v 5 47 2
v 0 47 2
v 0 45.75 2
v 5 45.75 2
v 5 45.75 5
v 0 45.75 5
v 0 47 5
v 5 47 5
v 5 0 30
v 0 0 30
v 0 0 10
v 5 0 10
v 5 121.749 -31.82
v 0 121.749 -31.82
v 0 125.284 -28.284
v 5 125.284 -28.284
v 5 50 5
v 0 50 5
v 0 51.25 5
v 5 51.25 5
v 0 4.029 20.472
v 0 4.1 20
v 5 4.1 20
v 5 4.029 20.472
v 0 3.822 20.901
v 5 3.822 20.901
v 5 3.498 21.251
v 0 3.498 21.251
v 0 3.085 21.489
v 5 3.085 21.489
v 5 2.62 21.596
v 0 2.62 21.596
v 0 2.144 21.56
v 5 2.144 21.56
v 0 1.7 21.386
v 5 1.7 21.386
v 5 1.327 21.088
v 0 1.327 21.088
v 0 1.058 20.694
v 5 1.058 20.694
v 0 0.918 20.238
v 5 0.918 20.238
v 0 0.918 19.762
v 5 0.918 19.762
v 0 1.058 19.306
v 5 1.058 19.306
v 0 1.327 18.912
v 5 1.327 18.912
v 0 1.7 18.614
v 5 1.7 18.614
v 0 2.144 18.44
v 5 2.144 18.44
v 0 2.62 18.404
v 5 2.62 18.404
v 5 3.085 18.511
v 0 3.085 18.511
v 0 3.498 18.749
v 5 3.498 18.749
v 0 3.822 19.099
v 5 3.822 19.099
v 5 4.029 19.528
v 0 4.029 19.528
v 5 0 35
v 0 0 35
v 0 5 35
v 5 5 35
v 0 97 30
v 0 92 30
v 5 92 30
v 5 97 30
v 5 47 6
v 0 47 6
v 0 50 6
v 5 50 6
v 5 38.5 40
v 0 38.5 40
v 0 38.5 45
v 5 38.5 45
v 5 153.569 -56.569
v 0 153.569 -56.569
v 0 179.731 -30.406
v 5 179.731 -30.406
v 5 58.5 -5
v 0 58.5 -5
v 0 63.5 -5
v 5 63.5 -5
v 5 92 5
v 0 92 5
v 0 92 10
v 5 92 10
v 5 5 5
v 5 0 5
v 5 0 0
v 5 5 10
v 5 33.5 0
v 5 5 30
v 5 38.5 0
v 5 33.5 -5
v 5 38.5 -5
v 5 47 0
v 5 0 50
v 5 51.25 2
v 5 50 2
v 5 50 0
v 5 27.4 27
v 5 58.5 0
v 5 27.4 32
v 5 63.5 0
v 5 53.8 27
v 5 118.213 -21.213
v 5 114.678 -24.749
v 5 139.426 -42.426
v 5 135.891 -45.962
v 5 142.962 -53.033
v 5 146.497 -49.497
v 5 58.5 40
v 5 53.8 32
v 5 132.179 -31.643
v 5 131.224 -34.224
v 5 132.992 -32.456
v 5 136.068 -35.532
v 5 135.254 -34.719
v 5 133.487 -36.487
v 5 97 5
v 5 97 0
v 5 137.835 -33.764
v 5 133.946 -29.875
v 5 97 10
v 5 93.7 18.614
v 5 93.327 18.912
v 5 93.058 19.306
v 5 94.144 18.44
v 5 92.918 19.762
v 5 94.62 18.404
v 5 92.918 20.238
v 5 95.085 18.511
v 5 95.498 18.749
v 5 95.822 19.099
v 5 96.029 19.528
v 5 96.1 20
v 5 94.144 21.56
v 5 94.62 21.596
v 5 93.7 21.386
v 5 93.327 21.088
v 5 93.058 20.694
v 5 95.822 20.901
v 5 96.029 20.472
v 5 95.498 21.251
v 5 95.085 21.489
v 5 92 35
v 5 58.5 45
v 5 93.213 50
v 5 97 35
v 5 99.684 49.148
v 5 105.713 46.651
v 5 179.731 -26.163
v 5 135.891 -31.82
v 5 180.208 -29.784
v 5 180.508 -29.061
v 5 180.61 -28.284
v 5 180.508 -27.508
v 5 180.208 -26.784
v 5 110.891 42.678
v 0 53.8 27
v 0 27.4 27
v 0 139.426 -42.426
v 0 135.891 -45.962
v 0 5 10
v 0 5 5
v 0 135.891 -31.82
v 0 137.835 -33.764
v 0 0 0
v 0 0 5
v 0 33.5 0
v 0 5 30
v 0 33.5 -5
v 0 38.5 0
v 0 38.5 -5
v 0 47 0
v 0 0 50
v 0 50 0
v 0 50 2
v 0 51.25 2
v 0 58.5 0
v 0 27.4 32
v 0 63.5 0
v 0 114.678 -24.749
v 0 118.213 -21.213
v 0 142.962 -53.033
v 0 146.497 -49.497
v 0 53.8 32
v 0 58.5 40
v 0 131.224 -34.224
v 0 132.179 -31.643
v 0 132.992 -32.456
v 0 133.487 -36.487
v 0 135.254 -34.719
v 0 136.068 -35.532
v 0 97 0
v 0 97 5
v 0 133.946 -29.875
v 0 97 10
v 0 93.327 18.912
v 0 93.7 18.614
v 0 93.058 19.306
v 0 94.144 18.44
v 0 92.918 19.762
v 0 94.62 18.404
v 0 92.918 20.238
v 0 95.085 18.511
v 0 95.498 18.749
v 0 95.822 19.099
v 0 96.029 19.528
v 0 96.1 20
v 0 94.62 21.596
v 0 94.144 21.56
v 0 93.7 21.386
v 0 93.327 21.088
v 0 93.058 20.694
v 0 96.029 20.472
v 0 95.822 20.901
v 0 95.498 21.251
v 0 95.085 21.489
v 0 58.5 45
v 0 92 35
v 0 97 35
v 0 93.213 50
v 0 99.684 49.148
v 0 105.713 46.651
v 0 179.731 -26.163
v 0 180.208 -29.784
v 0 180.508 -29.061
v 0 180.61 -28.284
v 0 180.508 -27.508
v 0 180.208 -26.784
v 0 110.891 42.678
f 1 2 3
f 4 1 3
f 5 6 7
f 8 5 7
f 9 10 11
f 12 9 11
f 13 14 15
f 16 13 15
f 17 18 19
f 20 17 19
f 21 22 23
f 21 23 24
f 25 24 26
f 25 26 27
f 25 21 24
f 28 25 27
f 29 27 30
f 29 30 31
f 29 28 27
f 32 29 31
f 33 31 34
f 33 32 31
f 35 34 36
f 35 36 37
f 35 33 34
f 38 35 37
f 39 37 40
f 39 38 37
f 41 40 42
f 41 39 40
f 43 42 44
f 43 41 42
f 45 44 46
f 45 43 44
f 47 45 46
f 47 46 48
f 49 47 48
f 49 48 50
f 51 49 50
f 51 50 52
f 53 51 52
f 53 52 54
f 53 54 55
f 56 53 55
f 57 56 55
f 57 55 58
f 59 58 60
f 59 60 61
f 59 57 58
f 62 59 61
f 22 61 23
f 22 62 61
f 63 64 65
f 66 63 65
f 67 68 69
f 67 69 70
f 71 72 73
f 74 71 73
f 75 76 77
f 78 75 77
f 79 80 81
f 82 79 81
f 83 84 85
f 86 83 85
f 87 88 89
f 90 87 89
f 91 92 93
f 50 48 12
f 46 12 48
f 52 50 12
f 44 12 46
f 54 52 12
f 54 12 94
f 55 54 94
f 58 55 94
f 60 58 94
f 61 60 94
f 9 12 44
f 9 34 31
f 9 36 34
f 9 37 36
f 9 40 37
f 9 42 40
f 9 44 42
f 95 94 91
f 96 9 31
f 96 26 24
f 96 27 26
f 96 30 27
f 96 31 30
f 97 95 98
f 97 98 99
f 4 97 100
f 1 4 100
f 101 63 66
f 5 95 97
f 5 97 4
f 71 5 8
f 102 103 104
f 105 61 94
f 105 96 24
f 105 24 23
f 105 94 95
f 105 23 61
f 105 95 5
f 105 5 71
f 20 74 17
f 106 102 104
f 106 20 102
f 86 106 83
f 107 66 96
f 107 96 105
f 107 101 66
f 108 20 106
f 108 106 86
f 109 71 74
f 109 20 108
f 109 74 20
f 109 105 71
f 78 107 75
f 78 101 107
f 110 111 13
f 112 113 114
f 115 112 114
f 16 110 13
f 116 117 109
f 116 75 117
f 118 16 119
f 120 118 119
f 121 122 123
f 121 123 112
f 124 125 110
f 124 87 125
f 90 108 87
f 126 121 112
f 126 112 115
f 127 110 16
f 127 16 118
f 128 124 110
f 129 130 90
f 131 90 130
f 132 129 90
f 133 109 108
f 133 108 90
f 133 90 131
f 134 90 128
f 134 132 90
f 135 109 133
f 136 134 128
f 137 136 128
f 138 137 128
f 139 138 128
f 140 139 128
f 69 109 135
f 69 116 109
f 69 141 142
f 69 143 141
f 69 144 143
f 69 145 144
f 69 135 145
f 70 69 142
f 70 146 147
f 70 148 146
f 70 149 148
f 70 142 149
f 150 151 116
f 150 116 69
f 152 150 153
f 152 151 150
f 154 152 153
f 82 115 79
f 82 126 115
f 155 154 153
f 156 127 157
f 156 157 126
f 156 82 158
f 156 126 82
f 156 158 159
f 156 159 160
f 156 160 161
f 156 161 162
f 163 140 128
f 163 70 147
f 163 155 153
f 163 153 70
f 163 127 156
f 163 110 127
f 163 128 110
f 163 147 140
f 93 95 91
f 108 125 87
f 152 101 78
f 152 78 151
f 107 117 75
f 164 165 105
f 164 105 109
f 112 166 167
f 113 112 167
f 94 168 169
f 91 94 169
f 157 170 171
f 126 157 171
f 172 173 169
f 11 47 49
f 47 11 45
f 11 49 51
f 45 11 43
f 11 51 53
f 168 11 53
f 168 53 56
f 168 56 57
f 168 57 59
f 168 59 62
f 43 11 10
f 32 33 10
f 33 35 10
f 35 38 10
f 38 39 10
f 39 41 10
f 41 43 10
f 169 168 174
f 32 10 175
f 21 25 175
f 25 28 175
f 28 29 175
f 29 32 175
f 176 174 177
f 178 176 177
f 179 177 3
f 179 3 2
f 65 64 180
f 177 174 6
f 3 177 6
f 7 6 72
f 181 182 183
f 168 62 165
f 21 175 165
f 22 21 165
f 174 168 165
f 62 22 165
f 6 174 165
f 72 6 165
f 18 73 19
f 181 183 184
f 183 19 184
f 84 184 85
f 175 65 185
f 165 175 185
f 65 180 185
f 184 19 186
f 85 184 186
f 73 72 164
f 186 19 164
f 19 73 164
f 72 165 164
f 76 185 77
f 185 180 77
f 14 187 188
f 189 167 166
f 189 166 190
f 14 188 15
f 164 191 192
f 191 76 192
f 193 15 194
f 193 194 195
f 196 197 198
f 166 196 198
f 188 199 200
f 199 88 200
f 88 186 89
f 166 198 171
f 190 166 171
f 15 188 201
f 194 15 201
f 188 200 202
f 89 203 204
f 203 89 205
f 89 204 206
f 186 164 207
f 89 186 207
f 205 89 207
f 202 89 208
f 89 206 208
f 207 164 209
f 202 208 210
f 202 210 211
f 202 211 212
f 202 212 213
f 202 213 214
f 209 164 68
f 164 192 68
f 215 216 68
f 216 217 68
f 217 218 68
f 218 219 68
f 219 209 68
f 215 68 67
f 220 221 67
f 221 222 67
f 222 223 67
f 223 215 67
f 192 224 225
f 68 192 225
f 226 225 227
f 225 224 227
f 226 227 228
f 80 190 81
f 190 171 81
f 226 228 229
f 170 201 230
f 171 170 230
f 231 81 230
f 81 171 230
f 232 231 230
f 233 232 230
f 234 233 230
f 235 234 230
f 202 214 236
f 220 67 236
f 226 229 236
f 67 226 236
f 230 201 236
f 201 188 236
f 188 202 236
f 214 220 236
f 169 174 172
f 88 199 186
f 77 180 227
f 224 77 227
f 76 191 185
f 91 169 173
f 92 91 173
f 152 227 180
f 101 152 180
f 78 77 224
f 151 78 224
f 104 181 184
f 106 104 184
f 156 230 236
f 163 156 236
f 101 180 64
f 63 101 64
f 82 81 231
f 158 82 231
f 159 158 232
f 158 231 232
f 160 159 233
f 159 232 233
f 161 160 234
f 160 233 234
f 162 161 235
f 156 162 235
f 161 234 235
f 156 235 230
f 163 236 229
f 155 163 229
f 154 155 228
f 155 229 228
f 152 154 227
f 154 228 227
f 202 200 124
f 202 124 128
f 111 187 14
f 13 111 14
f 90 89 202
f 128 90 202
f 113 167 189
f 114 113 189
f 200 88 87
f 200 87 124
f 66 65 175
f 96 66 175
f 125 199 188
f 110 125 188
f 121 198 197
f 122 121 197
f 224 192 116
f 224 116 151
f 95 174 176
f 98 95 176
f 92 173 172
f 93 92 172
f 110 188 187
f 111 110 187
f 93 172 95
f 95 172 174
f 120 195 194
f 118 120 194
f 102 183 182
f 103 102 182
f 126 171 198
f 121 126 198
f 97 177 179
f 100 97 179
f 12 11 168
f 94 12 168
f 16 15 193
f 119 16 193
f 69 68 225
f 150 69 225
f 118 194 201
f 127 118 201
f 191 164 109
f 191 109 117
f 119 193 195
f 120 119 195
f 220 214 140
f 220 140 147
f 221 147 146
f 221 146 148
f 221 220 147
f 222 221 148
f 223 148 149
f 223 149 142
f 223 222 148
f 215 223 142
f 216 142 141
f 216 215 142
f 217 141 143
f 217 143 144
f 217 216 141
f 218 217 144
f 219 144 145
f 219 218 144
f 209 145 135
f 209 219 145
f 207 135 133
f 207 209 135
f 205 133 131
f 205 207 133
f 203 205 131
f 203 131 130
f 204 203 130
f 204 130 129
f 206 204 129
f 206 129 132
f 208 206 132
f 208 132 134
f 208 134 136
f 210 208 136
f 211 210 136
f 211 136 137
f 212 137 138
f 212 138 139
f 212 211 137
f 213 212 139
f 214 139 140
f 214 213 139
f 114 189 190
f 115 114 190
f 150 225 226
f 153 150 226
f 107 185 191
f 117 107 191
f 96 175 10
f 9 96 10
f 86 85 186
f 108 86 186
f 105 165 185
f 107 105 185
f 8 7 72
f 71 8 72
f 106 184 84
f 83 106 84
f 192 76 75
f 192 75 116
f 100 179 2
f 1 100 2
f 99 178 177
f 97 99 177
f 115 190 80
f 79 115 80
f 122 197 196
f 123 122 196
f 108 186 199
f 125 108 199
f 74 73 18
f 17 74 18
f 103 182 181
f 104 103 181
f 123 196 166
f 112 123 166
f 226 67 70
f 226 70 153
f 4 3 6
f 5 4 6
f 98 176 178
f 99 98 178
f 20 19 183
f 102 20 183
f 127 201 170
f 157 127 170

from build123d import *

# Parameters (mm, degrees)
F1_R     = 1.6
F1_W     = 26.4
F1_H     = 5
F1_W_2   = 20
F1_W_3   = 5
F2_DEPTH = 5


with BuildPart() as f2:
    # F1 (on Right) → F2 (new body)
    with BuildSketch(Plane.YZ):
        with BuildLine():
            Line((0, 5), (0, 0))
            Line((0, 0), (33.5, 0))
            Line((33.5, 0), (33.5, -5))
            Line((33.5, -5), (38.5, -5))
            Line((38.5, -5), (38.5, 0))
            Line((38.5, 0), (47, 0))
            Line((47, 0), (47, 2))
            Line((47, 2), (45.75, 2))
            Line((45.75, 2), (45.75, 5))
            Line((45.75, 5), (47, 5))
            Line((47, 5), (47, 6))
            Line((47, 6), (50, 6))
            Line((50, 6), (50, 5))
            Line((50, 5), (51.25, 5))
            Line((51.25, 5), (51.25, 2))
            Line((51.25, 2), (50, 2))
            Line((50, 2), (50, 0))
            Line((50, 0), (58.5, 0))
            Line((58.5, 0), (58.5, -5))
            Line((58.5, -5), (63.5, -5))
            Line((63.5, -5), (63.5, 0))
            Line((63.5, 0), (97, 0))
            Line((97, 0), (118.2132034356, -21.2132034356))
            Line((118.2132034356, -21.2132034356), (125.2842712475, -28.2842712475))
            Line((125.2842712475, -28.2842712475), (131.2239682094, -34.2239682094))
            Line((131.2239682094, -34.2239682094), (132.9917351624, -32.4562012565))
            Line((132.9917351624, -32.4562012565), (132.178562364, -31.6430284581))
            Line((132.178562364, -31.6430284581), (133.946329317, -29.8752615051))
            Line((133.946329317, -29.8752615051), (135.8908729653, -31.8198051534))
            Line((135.8908729653, -31.8198051534), (137.8354166135, -33.7643488017))
            Line((137.8354166135, -33.7643488017), (136.0676496606, -35.5321157546))
            Line((136.0676496606, -35.5321157546), (135.2544768622, -34.7189429563))
            Line((135.2544768622, -34.7189429563), (133.4867099092, -36.4867099092))
            Line((133.4867099092, -36.4867099092), (139.4264068712, -42.4264068712))
            Line((139.4264068712, -42.4264068712), (146.4974746831, -49.4974746831))
            Line((146.4974746831, -49.4974746831), (153.5685424949, -56.5685424949))
            Line((153.5685424949, -56.5685424949), (179.7314933988, -30.405591591))
            ThreePointArc((179.7314933988, -30.405591591), (180.6101730553, -28.2842712475), (179.7314933988, -26.1629509039))
            Line((179.7314933988, -26.1629509039), (110.8908729653, 42.6776695297))
            ThreePointArc((110.8908729653, 42.6776695297), (102.7802892447, 48.0969883128), (93.2132034356, 50))
            Line((93.2132034356, 50), (0, 50))
            Line((0, 50), (0, 35))
            Line((0, 35), (5, 35))
            Line((5, 35), (5, 30))
            Line((5, 30), (0, 30))
            Line((0, 30), (0, 10))
            Line((0, 10), (5, 10))
            Line((5, 10), (5, 5))
            Line((5, 5), (0, 5))
        make_face()
        with Locations((2.5, 20)):
            Circle(F1_R, mode=Mode.SUBTRACT)
        with Locations((40.6, 29.5)):
            Rectangle(F1_W, F1_H, mode=Mode.SUBTRACT)
        with Locations((48.5, 42.5)):
            Rectangle(F1_W_2, F1_H, mode=Mode.SUBTRACT)
        with Locations((94.5, 7.5)):
            Rectangle(F1_W_3, F1_H, mode=Mode.SUBTRACT)
        with Locations((94.5, 20)):
            Circle(F1_R, mode=Mode.SUBTRACT)
        with Locations((94.5, 32.5)):
            Rectangle(F1_W_3, F1_H, mode=Mode.SUBTRACT)
        Polygon((142.9619407771, -53.033008589), (146.4974746831, -49.4974746831), (139.4264068712, -42.4264068712), (135.8908729653, -45.9619407771), align=None)
        Polygon((125.2842712475, -28.2842712475), (118.2132034356, -21.2132034356), (114.6776695297, -24.7487373415), (121.7487373415, -31.8198051534), align=None)
    extrude(amount=F2_DEPTH)


solid = f2.part
